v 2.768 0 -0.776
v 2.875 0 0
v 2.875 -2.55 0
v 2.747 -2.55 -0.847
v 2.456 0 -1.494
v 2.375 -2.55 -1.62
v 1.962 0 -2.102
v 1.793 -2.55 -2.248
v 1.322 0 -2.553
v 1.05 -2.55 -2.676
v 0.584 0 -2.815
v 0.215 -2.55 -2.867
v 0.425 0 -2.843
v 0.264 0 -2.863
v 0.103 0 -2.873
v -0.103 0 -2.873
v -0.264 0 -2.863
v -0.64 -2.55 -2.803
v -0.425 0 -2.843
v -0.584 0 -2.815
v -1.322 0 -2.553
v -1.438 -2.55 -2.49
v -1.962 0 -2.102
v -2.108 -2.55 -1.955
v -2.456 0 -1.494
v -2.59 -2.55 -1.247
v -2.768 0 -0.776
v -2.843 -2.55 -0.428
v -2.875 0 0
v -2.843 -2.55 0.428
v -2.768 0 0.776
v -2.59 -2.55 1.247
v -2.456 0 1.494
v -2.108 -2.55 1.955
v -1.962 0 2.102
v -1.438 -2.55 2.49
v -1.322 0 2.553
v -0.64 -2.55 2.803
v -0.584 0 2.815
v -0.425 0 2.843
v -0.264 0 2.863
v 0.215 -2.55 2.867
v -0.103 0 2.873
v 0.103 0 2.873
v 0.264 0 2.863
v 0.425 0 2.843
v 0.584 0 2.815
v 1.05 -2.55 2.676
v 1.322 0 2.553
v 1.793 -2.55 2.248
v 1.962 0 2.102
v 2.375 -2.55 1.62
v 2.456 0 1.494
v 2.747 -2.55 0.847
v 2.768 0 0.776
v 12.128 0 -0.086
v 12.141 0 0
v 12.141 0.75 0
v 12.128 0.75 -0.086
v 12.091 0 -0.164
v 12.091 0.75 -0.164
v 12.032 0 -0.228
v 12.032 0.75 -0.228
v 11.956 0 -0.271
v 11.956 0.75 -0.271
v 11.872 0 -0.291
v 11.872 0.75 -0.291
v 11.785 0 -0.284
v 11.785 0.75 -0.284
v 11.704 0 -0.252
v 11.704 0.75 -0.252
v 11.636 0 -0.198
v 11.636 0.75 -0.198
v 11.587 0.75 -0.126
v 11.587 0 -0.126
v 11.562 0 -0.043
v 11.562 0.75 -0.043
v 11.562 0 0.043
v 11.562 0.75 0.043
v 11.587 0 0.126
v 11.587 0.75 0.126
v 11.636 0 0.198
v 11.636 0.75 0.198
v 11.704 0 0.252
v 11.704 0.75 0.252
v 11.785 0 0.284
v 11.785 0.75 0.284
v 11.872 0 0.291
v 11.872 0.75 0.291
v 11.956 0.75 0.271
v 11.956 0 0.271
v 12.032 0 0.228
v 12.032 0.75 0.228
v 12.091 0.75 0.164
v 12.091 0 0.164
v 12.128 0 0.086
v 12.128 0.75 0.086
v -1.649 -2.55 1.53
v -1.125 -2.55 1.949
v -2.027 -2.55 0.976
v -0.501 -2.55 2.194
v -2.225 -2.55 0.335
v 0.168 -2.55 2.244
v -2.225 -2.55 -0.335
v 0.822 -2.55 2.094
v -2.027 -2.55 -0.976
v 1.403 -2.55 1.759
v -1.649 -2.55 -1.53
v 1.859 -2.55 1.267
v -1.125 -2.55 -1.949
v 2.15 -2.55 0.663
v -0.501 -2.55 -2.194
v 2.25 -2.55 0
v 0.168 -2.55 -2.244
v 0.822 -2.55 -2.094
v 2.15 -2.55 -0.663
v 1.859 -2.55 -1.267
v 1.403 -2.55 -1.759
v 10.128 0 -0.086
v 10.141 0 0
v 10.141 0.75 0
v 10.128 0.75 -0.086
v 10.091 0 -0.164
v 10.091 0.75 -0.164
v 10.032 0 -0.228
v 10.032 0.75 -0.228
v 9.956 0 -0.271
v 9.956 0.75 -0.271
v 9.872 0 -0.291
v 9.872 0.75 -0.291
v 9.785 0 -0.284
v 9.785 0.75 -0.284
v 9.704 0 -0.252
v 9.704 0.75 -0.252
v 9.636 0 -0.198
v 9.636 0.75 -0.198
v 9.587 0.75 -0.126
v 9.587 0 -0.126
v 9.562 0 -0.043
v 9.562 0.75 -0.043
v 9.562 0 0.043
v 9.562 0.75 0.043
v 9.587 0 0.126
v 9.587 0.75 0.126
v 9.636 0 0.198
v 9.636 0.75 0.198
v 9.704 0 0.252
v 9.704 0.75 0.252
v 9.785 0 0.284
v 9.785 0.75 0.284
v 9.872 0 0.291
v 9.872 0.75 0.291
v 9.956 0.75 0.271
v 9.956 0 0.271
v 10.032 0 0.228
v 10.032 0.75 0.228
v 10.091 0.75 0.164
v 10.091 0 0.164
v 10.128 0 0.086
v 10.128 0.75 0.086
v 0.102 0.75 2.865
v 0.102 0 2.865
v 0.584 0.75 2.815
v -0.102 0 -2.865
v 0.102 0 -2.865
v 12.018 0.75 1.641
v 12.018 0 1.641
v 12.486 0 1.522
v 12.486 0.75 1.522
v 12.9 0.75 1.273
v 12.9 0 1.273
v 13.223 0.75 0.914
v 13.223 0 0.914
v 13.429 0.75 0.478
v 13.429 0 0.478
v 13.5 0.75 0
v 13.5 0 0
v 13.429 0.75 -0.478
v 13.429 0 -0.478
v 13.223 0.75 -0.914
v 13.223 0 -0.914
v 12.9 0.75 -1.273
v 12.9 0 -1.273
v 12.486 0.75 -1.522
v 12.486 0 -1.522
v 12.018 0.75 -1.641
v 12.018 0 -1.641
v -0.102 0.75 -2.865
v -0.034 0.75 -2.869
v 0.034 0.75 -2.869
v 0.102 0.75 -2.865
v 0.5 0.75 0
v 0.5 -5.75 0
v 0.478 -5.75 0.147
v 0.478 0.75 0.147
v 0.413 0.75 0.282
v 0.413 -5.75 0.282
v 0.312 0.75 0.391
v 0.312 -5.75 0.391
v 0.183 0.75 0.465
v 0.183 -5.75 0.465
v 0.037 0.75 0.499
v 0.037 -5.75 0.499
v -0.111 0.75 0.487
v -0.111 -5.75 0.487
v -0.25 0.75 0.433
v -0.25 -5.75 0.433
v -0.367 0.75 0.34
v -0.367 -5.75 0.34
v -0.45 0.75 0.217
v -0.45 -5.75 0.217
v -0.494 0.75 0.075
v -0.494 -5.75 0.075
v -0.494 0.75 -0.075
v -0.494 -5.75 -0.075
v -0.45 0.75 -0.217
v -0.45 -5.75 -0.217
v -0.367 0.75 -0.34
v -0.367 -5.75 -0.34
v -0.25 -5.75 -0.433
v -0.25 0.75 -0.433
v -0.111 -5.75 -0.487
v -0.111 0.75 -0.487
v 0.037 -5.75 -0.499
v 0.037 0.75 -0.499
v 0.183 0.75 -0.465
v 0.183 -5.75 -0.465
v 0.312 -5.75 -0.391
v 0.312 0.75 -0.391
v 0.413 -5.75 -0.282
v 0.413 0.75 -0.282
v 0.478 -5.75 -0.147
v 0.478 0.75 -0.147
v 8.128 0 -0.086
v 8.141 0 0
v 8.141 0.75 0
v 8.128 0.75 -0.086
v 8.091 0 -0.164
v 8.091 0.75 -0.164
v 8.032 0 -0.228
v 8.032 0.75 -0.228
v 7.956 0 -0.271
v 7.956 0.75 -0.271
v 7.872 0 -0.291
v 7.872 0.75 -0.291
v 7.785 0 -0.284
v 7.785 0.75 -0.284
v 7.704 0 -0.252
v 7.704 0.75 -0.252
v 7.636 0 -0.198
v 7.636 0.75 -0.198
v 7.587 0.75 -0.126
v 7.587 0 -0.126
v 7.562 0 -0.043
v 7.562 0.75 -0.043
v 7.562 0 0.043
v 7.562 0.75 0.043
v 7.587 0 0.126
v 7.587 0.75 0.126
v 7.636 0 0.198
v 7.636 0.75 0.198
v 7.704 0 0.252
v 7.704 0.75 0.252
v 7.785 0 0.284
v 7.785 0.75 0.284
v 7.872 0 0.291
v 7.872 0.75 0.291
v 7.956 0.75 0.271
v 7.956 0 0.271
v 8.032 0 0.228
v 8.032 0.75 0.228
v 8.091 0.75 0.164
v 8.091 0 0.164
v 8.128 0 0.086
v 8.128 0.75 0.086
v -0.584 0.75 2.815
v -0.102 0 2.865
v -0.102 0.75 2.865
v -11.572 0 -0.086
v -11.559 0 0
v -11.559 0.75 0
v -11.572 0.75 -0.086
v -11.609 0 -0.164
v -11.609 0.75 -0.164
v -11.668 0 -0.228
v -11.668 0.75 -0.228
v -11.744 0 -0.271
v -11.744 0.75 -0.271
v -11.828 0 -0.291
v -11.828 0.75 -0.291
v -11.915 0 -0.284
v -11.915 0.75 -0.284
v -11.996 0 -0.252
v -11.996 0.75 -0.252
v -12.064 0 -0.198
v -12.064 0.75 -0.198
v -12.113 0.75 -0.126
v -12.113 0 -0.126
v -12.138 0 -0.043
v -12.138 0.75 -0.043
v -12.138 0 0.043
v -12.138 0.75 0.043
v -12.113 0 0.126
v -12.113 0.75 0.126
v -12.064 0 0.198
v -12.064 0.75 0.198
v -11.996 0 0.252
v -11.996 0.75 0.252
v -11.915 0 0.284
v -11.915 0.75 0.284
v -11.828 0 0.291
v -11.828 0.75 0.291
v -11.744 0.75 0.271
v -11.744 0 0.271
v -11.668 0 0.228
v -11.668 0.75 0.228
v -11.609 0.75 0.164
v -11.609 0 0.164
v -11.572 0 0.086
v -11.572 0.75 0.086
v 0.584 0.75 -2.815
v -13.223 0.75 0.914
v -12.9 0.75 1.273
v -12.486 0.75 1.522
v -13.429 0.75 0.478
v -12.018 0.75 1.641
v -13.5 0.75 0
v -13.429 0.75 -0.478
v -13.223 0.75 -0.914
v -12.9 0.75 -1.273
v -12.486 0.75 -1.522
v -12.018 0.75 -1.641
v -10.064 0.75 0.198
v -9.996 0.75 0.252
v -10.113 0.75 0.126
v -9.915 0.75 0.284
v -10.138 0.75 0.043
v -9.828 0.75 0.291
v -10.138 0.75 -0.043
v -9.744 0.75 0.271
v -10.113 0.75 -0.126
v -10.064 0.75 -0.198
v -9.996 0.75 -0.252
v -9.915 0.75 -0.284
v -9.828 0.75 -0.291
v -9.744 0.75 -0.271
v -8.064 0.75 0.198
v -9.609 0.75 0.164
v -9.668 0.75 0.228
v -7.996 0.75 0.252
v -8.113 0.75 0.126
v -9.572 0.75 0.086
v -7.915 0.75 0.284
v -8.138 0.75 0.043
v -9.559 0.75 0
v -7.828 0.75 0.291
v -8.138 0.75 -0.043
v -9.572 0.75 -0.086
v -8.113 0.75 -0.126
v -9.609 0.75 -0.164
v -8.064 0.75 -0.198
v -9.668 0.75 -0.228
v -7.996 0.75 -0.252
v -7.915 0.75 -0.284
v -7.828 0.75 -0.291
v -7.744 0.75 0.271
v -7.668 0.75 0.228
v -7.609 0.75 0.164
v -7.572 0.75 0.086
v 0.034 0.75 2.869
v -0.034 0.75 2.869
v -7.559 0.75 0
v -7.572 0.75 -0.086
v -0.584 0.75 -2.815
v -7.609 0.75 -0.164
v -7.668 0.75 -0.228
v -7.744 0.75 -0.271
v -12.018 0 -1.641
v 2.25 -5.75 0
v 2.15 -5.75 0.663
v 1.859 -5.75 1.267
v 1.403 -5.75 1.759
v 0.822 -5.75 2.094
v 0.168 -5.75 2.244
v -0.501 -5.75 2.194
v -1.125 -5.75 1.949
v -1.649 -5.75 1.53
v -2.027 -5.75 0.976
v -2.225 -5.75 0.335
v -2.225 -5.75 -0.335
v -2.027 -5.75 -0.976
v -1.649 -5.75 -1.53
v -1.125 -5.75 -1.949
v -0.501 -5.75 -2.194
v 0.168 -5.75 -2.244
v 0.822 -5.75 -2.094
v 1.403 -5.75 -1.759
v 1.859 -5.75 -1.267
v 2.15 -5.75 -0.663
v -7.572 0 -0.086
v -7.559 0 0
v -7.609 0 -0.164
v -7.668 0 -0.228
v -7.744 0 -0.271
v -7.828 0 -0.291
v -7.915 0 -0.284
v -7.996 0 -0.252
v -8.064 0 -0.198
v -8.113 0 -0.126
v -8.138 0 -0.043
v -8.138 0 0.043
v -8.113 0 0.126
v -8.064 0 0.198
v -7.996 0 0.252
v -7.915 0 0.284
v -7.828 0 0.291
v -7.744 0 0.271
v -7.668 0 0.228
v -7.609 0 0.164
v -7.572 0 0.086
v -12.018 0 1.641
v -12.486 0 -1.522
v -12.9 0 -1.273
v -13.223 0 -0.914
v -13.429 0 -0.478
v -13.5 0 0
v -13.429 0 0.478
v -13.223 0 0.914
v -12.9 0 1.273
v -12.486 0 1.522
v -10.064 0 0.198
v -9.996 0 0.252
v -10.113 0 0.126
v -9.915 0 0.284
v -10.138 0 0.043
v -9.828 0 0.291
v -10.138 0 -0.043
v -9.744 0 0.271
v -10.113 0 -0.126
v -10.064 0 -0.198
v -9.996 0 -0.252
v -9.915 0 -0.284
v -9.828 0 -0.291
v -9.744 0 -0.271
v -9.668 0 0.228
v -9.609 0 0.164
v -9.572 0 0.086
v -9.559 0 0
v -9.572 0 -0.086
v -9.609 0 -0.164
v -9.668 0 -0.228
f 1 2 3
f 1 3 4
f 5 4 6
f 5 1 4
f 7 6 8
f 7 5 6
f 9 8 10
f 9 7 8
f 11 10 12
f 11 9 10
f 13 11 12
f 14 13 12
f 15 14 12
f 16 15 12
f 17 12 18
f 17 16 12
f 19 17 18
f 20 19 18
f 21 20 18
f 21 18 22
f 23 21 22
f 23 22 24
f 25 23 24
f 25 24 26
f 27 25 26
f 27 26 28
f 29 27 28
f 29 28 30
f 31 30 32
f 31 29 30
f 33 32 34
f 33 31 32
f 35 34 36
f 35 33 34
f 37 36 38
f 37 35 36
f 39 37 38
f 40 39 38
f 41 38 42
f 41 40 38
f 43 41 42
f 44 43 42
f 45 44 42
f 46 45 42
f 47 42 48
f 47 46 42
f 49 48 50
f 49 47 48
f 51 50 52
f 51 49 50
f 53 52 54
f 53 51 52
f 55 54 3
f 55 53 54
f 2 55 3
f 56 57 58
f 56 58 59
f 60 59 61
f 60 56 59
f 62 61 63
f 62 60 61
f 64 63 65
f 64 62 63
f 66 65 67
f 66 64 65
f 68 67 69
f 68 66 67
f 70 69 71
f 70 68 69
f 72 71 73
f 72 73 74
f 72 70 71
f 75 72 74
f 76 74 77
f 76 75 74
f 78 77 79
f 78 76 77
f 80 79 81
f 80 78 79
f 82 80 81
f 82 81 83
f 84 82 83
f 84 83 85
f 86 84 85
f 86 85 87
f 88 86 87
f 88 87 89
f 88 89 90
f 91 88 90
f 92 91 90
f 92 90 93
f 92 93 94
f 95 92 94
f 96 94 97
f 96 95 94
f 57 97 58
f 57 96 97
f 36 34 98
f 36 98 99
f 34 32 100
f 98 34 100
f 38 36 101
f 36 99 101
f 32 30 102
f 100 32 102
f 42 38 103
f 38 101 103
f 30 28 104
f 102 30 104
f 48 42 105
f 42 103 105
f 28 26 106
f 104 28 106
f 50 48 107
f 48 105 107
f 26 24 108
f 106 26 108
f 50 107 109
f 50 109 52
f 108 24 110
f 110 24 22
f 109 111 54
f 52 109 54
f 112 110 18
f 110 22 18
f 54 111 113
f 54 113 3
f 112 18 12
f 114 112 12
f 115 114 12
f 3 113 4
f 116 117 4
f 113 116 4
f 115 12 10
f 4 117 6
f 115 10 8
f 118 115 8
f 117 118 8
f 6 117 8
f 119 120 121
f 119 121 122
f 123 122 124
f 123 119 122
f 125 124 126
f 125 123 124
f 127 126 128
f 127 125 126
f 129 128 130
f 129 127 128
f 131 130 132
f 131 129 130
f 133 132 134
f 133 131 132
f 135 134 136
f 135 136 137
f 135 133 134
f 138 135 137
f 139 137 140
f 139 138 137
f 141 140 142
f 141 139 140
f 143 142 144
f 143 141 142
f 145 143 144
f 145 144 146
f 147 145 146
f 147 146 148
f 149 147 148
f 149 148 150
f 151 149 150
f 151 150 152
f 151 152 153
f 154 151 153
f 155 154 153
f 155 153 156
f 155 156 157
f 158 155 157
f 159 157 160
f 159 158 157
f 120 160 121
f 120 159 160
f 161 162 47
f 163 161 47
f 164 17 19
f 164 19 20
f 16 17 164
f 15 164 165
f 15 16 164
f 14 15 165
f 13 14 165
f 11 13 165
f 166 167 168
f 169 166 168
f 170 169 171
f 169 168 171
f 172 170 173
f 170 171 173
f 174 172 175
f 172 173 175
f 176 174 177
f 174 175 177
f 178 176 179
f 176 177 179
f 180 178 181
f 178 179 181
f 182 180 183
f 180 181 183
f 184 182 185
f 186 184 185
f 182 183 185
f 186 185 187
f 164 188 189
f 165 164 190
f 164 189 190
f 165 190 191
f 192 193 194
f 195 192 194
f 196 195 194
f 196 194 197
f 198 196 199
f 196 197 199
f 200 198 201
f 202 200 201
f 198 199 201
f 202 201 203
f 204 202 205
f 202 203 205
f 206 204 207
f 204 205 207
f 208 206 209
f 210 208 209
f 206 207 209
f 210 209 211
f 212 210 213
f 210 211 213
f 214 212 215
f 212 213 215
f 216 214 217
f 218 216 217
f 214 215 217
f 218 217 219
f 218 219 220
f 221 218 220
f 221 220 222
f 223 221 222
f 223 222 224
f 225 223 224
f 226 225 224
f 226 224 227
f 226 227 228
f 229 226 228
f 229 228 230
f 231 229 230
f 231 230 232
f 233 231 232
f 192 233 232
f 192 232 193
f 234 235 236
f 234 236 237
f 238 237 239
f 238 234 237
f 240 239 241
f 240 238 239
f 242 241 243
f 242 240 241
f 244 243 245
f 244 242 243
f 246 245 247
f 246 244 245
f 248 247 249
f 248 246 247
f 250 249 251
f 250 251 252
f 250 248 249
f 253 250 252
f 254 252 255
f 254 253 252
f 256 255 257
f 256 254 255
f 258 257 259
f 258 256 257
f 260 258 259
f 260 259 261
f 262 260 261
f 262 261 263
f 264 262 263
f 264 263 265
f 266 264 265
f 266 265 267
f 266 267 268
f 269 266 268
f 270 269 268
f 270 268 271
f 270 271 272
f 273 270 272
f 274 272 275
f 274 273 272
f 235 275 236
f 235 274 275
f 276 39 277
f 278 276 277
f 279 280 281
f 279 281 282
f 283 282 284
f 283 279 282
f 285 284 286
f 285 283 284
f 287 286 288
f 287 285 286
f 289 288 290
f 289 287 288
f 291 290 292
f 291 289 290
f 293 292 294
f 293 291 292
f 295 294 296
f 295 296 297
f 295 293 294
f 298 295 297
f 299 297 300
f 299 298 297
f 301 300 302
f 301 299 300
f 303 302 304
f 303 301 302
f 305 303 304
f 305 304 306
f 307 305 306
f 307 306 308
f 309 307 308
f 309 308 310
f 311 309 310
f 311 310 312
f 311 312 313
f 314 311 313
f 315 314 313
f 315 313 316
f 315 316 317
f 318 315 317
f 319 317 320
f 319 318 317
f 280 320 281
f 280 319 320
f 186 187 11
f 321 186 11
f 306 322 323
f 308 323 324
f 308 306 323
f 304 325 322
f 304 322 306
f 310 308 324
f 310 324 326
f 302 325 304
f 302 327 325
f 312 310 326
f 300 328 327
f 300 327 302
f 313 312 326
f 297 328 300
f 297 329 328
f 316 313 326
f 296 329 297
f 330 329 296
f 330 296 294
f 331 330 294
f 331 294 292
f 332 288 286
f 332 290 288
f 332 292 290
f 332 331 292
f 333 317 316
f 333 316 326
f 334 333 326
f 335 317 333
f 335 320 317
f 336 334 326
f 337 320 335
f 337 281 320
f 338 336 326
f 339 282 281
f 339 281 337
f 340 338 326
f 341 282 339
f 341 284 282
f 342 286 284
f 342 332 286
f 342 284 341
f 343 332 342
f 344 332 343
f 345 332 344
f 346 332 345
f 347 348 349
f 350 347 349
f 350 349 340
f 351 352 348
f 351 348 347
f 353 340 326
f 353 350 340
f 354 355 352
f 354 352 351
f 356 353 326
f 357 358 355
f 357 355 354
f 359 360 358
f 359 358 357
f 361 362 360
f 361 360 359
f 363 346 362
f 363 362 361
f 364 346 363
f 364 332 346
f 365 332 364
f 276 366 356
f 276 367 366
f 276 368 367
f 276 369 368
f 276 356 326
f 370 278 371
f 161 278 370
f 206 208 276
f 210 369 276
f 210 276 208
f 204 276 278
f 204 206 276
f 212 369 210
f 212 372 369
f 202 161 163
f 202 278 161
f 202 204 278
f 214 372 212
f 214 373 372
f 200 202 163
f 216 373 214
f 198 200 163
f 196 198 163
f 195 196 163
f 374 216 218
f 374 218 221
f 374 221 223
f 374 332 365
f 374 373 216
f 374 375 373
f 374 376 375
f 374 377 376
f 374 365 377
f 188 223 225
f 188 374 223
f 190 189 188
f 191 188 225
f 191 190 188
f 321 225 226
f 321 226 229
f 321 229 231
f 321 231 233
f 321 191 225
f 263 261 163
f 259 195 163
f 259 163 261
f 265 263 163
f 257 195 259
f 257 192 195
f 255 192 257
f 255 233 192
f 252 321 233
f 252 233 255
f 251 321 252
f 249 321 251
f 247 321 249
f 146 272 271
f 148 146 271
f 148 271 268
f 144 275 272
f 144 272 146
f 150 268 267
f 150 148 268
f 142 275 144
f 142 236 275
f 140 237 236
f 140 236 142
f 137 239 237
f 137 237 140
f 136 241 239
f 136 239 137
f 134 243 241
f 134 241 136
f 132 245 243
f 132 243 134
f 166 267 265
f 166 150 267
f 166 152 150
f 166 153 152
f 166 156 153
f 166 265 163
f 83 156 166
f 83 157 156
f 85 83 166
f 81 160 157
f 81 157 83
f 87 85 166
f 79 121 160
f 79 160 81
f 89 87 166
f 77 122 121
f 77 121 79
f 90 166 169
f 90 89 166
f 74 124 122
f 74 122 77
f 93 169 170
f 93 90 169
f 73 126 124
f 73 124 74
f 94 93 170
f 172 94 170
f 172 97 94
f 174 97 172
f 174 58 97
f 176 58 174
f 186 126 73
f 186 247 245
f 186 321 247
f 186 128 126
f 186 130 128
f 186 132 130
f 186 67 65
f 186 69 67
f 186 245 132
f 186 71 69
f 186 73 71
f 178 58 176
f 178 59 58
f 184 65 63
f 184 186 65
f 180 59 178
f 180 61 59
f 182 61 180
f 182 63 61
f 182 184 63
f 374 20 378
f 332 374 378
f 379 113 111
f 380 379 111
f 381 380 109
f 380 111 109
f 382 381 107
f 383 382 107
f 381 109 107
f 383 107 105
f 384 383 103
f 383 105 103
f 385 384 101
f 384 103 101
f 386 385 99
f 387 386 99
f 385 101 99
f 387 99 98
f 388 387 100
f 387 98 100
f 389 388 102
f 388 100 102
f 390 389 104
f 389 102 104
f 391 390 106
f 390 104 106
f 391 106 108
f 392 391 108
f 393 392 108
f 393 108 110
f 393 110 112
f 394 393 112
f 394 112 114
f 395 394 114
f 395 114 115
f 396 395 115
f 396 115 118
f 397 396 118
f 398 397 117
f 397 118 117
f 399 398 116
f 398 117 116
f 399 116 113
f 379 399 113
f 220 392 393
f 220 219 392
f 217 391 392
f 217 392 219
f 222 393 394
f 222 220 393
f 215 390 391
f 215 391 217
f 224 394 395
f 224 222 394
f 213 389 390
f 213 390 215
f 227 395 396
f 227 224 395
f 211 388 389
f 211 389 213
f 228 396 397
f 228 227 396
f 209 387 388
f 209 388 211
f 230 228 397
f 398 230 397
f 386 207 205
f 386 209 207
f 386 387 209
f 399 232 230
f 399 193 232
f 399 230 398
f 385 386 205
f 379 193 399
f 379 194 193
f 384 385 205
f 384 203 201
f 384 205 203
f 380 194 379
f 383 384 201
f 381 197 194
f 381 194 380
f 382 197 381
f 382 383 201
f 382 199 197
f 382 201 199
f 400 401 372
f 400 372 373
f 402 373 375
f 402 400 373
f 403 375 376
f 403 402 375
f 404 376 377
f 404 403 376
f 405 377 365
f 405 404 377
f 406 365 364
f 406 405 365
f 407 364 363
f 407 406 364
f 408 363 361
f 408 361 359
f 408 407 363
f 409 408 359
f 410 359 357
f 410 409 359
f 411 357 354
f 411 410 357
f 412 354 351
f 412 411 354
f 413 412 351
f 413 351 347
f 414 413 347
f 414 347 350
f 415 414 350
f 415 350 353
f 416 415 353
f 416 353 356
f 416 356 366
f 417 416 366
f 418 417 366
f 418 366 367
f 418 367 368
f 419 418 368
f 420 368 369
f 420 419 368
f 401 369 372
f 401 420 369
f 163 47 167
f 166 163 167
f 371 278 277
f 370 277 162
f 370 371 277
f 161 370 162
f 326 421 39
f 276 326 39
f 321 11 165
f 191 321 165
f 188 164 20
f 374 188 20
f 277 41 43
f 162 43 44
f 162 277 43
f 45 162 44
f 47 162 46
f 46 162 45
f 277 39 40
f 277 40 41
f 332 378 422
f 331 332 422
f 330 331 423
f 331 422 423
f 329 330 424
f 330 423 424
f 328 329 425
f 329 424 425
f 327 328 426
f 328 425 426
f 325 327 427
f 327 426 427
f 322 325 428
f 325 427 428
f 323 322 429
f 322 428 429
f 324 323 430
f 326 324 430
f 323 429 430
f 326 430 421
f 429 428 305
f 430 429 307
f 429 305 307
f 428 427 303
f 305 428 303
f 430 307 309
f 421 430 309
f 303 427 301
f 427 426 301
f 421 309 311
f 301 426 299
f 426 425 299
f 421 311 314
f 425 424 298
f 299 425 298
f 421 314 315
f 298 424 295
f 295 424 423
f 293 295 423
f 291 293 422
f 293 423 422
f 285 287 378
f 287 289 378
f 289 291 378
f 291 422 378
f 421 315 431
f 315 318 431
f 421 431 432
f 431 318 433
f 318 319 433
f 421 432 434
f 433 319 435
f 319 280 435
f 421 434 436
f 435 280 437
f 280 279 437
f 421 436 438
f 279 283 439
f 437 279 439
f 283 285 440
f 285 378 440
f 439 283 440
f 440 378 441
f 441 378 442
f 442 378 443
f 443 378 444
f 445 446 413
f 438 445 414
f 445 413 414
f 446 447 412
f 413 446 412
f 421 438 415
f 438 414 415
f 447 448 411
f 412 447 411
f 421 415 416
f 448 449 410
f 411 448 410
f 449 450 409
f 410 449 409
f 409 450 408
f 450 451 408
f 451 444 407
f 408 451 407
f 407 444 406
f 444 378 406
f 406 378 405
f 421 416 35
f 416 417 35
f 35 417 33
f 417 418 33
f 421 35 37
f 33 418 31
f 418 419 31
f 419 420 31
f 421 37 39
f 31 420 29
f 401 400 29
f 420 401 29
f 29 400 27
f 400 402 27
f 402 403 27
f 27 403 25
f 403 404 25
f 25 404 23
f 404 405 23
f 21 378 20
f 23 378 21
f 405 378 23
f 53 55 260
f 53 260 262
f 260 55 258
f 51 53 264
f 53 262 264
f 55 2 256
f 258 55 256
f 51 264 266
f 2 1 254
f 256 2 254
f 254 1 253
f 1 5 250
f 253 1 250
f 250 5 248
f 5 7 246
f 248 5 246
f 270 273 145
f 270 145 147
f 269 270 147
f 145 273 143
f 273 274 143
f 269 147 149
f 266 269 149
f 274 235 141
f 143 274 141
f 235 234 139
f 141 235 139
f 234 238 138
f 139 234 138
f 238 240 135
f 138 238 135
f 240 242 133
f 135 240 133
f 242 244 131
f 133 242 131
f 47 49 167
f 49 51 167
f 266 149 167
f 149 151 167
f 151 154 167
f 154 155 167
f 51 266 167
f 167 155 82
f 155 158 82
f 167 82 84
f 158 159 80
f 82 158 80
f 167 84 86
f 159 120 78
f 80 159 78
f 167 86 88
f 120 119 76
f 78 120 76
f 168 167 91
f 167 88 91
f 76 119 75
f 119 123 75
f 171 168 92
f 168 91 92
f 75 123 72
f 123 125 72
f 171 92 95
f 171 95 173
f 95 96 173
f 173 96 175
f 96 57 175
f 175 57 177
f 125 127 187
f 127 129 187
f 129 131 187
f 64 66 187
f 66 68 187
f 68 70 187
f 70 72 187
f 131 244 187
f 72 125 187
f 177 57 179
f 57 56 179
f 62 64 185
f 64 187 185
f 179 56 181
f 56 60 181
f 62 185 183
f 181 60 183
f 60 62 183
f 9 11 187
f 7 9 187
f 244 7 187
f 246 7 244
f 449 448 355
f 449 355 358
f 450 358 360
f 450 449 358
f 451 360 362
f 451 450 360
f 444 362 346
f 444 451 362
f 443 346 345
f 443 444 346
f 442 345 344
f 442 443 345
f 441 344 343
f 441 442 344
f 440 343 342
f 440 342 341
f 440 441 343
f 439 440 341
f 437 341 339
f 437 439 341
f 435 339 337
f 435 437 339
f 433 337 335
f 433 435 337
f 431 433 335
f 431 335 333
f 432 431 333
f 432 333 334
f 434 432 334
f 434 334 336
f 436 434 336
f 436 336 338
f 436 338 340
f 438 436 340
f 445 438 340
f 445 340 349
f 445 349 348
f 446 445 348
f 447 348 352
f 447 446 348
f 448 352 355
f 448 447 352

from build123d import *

# Parameters (mm, degrees)
SKETCH1_R           = 2.875
BOSS_EXTRUDE1_DEPTH = 2.55
SKETCH1_4_R         = 0.291434634
BOSS_EXTRUDE2_DEPTH = 0.75
SKETCH2_R           = 2.25
BOSS_EXTRUDE3_DEPTH = 3.2
SKETCH3_R           = 0.5
CUT_EXTRUDE1_DEPTH  = 16.256658382
FILLET1_R           = 1


with BuildPart() as part:
    # Sketch1 → Boss-Extrude1 (new body)
    with BuildSketch(Plane(origin=(0, 0, 0), x_dir=(1, 0, 0), z_dir=(0, 1, 0))):
        Circle(SKETCH1_R)
    extrude(amount=-BOSS_EXTRUDE1_DEPTH)

    # Sketch1<4> → Boss-Extrude2 (add)
    with BuildSketch(Plane(origin=(0, 0, 0), x_dir=(1, 0, 0), z_dir=(0, 1, 0))):
        with BuildLine():
            ThreePointArc((-12.018477316, 1.641376067), (-13.5, 0), (-12.018477316, -1.641376067))
            Line((-12.018477316, -1.641376067), (0, -2.875))
            Line((0, -2.875), (12.018477316, -1.641376067))
            ThreePointArc((12.018477316, -1.641376067), (13.5, 0), (12.018477316, 1.641376067))
            Line((12.018477316, 1.641376067), (0, 2.875))
            Line((0, 2.875), (-12.018477316, 1.641376067))
        make_face()
        with Locations((-11.85, 0)):
            Circle(SKETCH1_4_R, mode=Mode.SUBTRACT)
        with Locations((-9.85, 0)):
            Circle(SKETCH1_4_R, mode=Mode.SUBTRACT)
        with Locations((-7.85, 0)):
            Circle(SKETCH1_4_R, mode=Mode.SUBTRACT)
        with Locations((9.85, 0)):
            Circle(SKETCH1_4_R, mode=Mode.SUBTRACT)
        with Locations((11.85, 0)):
            Circle(SKETCH1_4_R, mode=Mode.SUBTRACT)
        with Locations((7.85, 0)):
            Circle(SKETCH1_4_R, mode=Mode.SUBTRACT)
    extrude(amount=BOSS_EXTRUDE2_DEPTH)

    # Sketch2 → Boss-Extrude3 (add)
    with BuildSketch(Plane.XZ.offset(2.55)):
        Circle(SKETCH2_R)
    extrude(amount=BOSS_EXTRUDE3_DEPTH)

    # Sketch3 → Cut-Extrude1 (cut, through all)
    with BuildSketch(Plane.XZ.offset(5.75)):
        Circle(SKETCH3_R)
    extrude(amount=-CUT_EXTRUDE1_DEPTH, mode=Mode.SUBTRACT)

    # Fillet1
    fillet1_edges = [part.edges().sort_by_distance(p)[0] for p in [
        (0, 0.375, 2.875),
        (0, 0.375, -2.875),
    ]]
    fillet(fillet1_edges, radius=FILLET1_R)


solid = part.part
